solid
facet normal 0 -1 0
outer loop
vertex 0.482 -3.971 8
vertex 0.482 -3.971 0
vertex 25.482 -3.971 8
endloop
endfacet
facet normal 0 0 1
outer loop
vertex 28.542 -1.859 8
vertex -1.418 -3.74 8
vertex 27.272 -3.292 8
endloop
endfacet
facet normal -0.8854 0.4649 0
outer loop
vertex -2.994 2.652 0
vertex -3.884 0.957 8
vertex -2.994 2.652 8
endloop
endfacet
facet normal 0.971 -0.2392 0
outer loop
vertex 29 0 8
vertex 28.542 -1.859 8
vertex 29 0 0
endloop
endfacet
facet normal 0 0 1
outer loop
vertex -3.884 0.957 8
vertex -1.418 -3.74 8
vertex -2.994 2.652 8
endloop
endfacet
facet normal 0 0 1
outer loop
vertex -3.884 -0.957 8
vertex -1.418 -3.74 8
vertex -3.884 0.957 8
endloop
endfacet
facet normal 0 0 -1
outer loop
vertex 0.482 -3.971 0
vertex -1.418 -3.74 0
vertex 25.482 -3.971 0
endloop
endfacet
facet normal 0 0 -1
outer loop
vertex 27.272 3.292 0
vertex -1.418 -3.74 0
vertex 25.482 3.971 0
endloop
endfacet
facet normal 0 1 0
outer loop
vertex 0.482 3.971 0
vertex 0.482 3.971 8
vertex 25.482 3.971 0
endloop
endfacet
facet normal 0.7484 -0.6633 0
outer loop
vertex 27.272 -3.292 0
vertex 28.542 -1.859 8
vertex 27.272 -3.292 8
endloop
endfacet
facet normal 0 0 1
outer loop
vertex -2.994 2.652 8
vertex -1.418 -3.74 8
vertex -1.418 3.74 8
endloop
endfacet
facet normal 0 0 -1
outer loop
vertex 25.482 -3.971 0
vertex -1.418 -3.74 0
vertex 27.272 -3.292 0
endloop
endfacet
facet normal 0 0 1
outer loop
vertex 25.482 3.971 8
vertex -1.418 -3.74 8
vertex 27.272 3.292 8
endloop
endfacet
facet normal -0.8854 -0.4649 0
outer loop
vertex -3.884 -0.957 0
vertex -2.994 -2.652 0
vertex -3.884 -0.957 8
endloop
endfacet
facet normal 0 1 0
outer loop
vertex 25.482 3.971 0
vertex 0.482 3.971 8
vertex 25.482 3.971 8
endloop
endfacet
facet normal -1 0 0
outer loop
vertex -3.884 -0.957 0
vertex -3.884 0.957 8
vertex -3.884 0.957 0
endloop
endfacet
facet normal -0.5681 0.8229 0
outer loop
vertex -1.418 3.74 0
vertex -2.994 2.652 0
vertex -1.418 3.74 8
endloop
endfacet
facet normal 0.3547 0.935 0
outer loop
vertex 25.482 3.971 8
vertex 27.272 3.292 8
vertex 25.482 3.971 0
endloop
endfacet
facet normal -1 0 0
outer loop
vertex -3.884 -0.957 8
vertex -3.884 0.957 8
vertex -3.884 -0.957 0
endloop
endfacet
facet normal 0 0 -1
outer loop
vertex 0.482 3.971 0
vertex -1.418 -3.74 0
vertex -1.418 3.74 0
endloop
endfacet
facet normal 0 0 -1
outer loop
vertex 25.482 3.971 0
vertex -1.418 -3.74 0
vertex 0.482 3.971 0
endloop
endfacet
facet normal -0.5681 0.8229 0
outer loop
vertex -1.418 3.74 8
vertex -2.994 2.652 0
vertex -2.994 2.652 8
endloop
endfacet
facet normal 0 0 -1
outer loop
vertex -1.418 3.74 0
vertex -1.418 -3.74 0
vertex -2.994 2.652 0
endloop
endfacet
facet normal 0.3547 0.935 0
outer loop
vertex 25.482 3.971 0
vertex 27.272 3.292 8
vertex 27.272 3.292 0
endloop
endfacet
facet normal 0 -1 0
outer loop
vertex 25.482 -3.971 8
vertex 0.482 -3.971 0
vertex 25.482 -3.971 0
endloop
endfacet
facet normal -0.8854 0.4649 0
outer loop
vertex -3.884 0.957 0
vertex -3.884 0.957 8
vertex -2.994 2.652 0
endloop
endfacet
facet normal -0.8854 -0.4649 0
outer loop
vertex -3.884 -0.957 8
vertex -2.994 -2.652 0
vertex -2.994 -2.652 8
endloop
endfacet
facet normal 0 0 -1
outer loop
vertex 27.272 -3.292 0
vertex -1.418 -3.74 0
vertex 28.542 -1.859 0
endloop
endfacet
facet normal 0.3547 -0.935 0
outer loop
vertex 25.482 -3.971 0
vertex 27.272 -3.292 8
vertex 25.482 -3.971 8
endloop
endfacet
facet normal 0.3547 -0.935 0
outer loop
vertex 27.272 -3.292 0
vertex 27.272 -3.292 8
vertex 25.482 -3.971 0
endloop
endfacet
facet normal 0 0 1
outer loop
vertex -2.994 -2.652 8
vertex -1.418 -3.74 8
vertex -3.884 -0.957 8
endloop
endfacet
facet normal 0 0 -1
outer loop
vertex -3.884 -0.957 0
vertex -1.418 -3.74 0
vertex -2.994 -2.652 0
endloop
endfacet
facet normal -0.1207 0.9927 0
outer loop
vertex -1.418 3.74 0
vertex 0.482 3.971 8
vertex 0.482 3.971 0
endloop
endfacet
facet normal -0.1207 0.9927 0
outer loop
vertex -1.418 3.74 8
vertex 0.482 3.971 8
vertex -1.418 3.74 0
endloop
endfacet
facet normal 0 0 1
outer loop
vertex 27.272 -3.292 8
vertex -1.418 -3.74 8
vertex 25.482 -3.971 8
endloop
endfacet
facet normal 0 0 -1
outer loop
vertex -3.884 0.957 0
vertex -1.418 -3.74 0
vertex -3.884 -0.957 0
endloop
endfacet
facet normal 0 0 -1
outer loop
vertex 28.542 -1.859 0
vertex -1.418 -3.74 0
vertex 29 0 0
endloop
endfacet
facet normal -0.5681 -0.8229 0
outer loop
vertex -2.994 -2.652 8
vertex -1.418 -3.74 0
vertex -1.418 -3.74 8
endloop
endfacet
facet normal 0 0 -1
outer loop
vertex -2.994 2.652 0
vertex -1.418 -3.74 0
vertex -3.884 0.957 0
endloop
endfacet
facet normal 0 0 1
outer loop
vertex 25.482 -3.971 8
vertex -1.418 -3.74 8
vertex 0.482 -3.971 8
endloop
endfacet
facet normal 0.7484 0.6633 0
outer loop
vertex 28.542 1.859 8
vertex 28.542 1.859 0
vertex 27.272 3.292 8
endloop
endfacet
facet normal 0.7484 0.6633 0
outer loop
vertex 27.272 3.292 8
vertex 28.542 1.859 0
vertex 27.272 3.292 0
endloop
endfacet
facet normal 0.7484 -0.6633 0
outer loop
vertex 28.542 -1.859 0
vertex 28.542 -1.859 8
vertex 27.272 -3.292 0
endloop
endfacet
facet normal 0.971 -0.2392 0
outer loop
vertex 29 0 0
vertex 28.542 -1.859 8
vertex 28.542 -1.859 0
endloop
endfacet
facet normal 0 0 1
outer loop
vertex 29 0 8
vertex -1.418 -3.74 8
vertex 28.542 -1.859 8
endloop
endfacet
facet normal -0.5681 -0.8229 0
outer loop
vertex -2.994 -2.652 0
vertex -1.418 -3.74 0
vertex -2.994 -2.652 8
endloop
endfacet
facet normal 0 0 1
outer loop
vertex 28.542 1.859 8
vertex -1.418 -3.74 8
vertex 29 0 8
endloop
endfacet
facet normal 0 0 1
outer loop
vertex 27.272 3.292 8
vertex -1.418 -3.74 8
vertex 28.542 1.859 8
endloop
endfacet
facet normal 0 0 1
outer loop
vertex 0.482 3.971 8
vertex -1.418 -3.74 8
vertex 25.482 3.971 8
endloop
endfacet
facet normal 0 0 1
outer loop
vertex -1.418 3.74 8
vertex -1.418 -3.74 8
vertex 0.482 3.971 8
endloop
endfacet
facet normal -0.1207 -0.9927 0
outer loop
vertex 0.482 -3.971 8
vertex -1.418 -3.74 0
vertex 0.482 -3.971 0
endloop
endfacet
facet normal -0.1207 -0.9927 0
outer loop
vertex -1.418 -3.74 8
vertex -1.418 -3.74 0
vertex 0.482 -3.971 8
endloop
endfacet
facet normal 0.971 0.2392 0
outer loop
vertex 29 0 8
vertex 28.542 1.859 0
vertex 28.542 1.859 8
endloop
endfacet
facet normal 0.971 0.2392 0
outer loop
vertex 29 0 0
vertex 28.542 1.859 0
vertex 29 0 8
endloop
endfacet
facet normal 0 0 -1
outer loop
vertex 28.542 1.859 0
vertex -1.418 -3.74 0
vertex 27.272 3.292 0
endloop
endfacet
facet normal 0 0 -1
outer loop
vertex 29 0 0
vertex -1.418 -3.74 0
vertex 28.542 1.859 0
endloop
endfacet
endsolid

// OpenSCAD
// BOSL-style slot() - stadium/capsule shape
module slot(h = 10, l = 20, r = 5) {
    hull() {
        cylinder(h = h, r = r);
        translate([l, 0, 0]) cylinder(h = h, r = r);
    }
}

slot(h = 8, l = 25, r = 4);
